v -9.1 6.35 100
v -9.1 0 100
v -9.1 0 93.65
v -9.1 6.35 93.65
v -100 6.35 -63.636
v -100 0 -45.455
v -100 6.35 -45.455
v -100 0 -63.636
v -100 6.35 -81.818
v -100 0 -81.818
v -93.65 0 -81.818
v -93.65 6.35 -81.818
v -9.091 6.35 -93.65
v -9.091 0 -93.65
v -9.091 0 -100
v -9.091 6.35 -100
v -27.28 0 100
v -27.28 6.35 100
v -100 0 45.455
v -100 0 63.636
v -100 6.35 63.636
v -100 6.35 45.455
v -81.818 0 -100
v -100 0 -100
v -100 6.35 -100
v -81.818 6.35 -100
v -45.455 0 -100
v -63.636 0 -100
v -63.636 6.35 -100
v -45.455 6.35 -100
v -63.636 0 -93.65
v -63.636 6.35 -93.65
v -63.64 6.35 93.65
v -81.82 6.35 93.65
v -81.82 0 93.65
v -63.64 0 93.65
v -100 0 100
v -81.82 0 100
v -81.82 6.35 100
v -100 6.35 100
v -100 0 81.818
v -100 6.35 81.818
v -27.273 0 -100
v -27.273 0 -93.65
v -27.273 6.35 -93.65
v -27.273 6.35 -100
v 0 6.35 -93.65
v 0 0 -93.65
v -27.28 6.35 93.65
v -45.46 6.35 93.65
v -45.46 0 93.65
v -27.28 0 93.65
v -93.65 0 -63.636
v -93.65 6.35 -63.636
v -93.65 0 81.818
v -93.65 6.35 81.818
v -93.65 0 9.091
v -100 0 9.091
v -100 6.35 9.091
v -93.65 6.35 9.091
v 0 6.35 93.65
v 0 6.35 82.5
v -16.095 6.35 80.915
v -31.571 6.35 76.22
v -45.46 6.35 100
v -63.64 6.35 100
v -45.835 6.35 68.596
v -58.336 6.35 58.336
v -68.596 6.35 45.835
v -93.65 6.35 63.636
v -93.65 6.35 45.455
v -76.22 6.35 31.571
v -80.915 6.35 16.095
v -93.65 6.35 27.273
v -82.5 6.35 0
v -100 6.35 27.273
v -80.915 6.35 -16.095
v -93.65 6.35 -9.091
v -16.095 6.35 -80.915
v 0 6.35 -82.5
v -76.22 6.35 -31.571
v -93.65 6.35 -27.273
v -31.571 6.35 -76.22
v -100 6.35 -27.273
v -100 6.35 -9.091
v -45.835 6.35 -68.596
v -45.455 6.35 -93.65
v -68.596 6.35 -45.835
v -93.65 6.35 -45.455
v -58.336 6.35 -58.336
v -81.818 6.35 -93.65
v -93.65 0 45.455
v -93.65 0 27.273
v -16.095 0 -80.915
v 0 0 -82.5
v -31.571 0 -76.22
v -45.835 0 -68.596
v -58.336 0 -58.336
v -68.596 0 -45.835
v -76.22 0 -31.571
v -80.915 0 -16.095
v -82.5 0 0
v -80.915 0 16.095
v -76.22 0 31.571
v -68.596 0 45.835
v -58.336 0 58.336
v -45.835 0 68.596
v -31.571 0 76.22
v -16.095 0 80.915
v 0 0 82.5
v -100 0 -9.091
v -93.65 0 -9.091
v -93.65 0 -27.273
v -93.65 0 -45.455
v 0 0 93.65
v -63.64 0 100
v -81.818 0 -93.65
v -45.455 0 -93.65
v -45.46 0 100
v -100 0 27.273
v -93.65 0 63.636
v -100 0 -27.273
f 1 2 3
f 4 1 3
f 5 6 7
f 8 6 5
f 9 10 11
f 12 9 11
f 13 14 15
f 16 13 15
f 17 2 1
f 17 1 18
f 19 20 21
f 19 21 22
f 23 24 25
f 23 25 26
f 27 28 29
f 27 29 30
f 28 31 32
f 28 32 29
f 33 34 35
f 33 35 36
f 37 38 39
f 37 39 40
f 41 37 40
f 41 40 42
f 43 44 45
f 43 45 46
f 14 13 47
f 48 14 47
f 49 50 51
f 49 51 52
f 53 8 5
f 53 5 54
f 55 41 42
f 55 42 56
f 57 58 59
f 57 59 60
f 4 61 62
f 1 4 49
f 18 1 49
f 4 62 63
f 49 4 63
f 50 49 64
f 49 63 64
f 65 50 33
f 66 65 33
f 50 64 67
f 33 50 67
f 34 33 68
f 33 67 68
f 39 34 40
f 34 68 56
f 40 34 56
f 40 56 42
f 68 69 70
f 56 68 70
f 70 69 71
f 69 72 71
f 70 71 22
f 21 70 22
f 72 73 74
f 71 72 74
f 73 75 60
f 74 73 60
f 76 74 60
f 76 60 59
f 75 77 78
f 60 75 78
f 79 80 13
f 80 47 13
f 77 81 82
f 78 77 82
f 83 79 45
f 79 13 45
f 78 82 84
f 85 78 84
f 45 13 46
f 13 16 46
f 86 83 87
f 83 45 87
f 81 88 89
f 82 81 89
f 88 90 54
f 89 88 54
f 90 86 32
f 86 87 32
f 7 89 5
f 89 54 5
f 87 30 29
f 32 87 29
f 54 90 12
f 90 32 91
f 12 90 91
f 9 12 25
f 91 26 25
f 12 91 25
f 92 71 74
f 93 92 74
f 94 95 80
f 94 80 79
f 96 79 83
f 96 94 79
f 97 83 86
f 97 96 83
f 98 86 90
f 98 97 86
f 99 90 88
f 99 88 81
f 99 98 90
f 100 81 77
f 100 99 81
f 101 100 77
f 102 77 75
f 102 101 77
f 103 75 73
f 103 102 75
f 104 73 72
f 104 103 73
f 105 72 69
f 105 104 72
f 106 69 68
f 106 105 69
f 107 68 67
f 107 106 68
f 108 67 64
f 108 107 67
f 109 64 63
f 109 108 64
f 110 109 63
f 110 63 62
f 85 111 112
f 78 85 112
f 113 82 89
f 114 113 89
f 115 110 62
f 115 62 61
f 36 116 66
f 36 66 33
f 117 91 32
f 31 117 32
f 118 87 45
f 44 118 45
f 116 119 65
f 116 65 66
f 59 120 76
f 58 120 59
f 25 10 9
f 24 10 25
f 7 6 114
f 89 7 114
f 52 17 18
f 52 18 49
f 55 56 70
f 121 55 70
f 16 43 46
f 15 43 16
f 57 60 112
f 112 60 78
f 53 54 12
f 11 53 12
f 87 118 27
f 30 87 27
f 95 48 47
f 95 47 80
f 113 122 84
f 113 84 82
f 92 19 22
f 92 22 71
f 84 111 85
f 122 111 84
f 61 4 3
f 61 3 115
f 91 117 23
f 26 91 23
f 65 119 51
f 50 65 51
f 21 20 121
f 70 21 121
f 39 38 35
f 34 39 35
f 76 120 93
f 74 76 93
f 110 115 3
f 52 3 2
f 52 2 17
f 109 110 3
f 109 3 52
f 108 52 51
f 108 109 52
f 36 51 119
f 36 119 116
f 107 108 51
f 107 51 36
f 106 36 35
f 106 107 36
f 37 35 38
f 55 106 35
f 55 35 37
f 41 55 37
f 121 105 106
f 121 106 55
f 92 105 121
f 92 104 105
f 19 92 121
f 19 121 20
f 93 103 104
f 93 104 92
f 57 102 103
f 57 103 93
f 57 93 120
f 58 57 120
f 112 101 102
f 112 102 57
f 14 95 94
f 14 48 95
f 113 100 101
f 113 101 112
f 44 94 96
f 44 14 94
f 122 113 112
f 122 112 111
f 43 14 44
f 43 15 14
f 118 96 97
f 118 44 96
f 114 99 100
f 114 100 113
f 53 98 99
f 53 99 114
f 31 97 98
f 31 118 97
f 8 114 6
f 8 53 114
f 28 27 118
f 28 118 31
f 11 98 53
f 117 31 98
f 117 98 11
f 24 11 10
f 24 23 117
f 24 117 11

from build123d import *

# Parameters (mm, degrees)
BOSS_EXTRU_1_DEPTH      = 6.35
ESQUISSE2_W             = 18.18
ESQUISSE2_H             = 6.35
ESQUISSE2_W_2           = 6.35
ESQUISSE2_H_2           = 18.181818182
ESQUISSE2_W_3           = 18.181818182
ENL_V_MAT_EXTRU_1_DEPTH = 6.35


with BuildPart() as part:
    # Esquisse1 → Boss.-Extru.1 (new body)
    with BuildSketch(Plane(origin=(0, 0, 0), x_dir=(1, 0, 0), z_dir=(0, 1, 0))):
        with BuildLine():
            Line((0, -82.5), (0, -100))
            Line((0, -100), (-100, -100))
            Line((-100, -100), (-100, 100))
            Line((-100, 100), (0, 100))
            Line((0, 100), (0, 82.5))
            ThreePointArc((0, 82.5), (-82.5, 0), (0, -82.5))
        make_face()
    extrude(amount=BOSS_EXTRU_1_DEPTH)

    # Esquisse2 → Enlèv. mat.-Extru.1 (cut)
    with BuildSketch(Plane(origin=(0, 6.35, 0), x_dir=(1, 0, 0), z_dir=(0, 1, 0))):
        with Locations((-72.73, -96.825)):
            Rectangle(ESQUISSE2_W, ESQUISSE2_H)
        with Locations((-36.37, -96.825)):
            Rectangle(ESQUISSE2_W, ESQUISSE2_H)
        with Locations((-0.01, -96.825)):
            Rectangle(ESQUISSE2_W, ESQUISSE2_H)
        with Locations((-96.825, -72.727272727)):
            Rectangle(ESQUISSE2_W_2, ESQUISSE2_H_2)
        with Locations((-96.825, -36.363636364)):
            Rectangle(ESQUISSE2_W_2, ESQUISSE2_H_2)
        with Locations((-96.825, 0)):
            Rectangle(ESQUISSE2_W_2, ESQUISSE2_H_2)
        with Locations((-96.825, 36.363636364)):
            Rectangle(ESQUISSE2_W_2, ESQUISSE2_H_2)
        with Locations((-96.825, 72.727272727)):
            Rectangle(ESQUISSE2_W_2, ESQUISSE2_H_2)
        with Locations((-72.727272727, 96.825)):
            Rectangle(ESQUISSE2_W_3, ESQUISSE2_H)
        with Locations((-36.363636364, 96.825)):
            Rectangle(ESQUISSE2_W_3, ESQUISSE2_H)
        with Locations((-0.000909091, 96.825)):
            Rectangle(ESQUISSE2_W, ESQUISSE2_H)
    extrude(amount=-ENL_V_MAT_EXTRU_1_DEPTH, mode=Mode.SUBTRACT)


solid = part.part
